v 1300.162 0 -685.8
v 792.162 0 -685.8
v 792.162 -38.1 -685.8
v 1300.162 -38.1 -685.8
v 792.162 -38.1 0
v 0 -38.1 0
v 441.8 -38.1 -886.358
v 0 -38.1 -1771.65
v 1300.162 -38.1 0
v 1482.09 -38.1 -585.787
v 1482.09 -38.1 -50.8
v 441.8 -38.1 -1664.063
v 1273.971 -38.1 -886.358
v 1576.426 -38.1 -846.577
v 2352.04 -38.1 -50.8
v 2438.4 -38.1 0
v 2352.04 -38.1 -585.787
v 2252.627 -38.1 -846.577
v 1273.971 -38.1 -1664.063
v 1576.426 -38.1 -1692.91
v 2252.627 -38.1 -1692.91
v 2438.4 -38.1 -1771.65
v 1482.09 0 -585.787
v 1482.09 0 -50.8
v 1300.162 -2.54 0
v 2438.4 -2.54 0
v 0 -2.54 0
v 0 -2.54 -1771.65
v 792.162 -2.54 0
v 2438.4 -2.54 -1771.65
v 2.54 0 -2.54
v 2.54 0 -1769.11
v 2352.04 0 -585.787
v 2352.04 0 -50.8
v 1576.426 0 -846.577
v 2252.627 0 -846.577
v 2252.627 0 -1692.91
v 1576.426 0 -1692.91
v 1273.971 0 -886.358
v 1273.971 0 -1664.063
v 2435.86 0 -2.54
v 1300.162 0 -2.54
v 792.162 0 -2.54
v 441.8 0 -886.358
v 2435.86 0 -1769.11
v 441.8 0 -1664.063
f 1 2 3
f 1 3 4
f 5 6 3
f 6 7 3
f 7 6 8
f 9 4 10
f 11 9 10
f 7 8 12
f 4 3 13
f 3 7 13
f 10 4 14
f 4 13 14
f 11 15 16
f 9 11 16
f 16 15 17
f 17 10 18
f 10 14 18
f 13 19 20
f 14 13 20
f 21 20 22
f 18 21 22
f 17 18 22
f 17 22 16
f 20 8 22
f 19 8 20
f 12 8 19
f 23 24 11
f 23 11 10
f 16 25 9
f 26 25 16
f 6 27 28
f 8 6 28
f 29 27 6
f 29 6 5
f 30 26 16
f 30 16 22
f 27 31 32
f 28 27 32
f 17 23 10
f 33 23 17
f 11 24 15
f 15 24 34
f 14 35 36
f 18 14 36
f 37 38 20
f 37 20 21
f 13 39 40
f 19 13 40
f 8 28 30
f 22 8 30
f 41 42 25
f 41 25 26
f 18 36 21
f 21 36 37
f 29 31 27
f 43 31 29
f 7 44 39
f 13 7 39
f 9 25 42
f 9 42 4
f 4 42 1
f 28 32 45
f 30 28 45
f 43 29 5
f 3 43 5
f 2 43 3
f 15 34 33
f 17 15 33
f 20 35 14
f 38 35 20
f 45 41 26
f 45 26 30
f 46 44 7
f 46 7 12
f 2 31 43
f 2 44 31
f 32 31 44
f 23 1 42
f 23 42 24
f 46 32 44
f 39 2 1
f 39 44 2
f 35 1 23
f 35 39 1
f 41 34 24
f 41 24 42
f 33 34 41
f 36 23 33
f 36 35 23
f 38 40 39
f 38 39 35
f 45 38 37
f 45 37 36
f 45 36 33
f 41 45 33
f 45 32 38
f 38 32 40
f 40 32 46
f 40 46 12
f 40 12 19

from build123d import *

# Parameters (mm, degrees)
SKETCH1_W           = 2438.4
SKETCH1_H           = 1771.65
BOSS_EXTRUDE1_DEPTH = 38.1
CHAMFER1_SIZE       = 2.54
SKETCH2_W           = 869.95
SKETCH2_H           = 534.9875
CUT_EXTRUDE1_DEPTH  = 39.1
SKETCH3_W           = 508
SKETCH3_H           = 685.8
CUT_EXTRUDE2_DEPTH  = 39.1
SKETCH4_W           = 676.20134
SKETCH4_H           = 846.33308
CUT_EXTRUDE3_DEPTH  = 39.1
SKETCH5_W           = 832.171110348
SKETCH5_H           = 777.705149966
CUT_EXTRUDE4_DEPTH  = 39.1


with BuildPart() as part:
    # Sketch1 → Boss-Extrude1 (new body)
    with BuildSketch(Plane(origin=(0, 0, 0), x_dir=(1, 0, 0), z_dir=(0, 1, 0))):
        with Locations((1219.2, 885.825)):
            Rectangle(SKETCH1_W, SKETCH1_H)
    extrude(amount=-BOSS_EXTRUDE1_DEPTH)

    # Chamfer1
    chamfer1_edges = [part.edges().sort_by_distance(p)[0] for p in [
        (0, 0, -885.825),
        (1219.2, 0, -1771.65),
        (2438.4, 0, -885.825),
        (1219.2, 0, 0),
    ]]
    chamfer(chamfer1_edges, length=CHAMFER1_SIZE)

    # Sketch2 → Cut-Extrude1 (cut, through all)
    with BuildSketch(Plane(origin=(0, 0, 0), x_dir=(1, 0, 0), z_dir=(0, 1, 0))):
        with Locations((1917.065, 318.29375)):
            Rectangle(SKETCH2_W, SKETCH2_H)
    extrude(amount=-CUT_EXTRUDE1_DEPTH, mode=Mode.SUBTRACT)

    # Sketch3 → Cut-Extrude2 (cut, through all)
    with BuildSketch(Plane(origin=(0, 0, 0), x_dir=(1, 0, 0), z_dir=(0, 1, 0))):
        with Locations((1046.1625, 342.9)):
            Rectangle(SKETCH3_W, SKETCH3_H)
    extrude(amount=-CUT_EXTRUDE2_DEPTH, mode=Mode.SUBTRACT)

    # Sketch4 → Cut-Extrude3 (cut, through all)
    with BuildSketch(Plane(origin=(0, 0, 0), x_dir=(1, 0, 0), z_dir=(0, 1, 0))):
        with Locations((1914.52627, 1269.74346)):
            Rectangle(SKETCH4_W, SKETCH4_H)
    extrude(amount=-CUT_EXTRUDE3_DEPTH, mode=Mode.SUBTRACT)

    # Sketch5 → Cut-Extrude4 (cut, through all)
    with BuildSketch(Plane(origin=(0, 0, 0), x_dir=(1, 0, 0), z_dir=(0, 1, 0))):
        with Locations((857.885146865, 1275.210240055)):
            Rectangle(SKETCH5_W, SKETCH5_H)
    extrude(amount=-CUT_EXTRUDE4_DEPTH, mode=Mode.SUBTRACT)


solid = part.part
